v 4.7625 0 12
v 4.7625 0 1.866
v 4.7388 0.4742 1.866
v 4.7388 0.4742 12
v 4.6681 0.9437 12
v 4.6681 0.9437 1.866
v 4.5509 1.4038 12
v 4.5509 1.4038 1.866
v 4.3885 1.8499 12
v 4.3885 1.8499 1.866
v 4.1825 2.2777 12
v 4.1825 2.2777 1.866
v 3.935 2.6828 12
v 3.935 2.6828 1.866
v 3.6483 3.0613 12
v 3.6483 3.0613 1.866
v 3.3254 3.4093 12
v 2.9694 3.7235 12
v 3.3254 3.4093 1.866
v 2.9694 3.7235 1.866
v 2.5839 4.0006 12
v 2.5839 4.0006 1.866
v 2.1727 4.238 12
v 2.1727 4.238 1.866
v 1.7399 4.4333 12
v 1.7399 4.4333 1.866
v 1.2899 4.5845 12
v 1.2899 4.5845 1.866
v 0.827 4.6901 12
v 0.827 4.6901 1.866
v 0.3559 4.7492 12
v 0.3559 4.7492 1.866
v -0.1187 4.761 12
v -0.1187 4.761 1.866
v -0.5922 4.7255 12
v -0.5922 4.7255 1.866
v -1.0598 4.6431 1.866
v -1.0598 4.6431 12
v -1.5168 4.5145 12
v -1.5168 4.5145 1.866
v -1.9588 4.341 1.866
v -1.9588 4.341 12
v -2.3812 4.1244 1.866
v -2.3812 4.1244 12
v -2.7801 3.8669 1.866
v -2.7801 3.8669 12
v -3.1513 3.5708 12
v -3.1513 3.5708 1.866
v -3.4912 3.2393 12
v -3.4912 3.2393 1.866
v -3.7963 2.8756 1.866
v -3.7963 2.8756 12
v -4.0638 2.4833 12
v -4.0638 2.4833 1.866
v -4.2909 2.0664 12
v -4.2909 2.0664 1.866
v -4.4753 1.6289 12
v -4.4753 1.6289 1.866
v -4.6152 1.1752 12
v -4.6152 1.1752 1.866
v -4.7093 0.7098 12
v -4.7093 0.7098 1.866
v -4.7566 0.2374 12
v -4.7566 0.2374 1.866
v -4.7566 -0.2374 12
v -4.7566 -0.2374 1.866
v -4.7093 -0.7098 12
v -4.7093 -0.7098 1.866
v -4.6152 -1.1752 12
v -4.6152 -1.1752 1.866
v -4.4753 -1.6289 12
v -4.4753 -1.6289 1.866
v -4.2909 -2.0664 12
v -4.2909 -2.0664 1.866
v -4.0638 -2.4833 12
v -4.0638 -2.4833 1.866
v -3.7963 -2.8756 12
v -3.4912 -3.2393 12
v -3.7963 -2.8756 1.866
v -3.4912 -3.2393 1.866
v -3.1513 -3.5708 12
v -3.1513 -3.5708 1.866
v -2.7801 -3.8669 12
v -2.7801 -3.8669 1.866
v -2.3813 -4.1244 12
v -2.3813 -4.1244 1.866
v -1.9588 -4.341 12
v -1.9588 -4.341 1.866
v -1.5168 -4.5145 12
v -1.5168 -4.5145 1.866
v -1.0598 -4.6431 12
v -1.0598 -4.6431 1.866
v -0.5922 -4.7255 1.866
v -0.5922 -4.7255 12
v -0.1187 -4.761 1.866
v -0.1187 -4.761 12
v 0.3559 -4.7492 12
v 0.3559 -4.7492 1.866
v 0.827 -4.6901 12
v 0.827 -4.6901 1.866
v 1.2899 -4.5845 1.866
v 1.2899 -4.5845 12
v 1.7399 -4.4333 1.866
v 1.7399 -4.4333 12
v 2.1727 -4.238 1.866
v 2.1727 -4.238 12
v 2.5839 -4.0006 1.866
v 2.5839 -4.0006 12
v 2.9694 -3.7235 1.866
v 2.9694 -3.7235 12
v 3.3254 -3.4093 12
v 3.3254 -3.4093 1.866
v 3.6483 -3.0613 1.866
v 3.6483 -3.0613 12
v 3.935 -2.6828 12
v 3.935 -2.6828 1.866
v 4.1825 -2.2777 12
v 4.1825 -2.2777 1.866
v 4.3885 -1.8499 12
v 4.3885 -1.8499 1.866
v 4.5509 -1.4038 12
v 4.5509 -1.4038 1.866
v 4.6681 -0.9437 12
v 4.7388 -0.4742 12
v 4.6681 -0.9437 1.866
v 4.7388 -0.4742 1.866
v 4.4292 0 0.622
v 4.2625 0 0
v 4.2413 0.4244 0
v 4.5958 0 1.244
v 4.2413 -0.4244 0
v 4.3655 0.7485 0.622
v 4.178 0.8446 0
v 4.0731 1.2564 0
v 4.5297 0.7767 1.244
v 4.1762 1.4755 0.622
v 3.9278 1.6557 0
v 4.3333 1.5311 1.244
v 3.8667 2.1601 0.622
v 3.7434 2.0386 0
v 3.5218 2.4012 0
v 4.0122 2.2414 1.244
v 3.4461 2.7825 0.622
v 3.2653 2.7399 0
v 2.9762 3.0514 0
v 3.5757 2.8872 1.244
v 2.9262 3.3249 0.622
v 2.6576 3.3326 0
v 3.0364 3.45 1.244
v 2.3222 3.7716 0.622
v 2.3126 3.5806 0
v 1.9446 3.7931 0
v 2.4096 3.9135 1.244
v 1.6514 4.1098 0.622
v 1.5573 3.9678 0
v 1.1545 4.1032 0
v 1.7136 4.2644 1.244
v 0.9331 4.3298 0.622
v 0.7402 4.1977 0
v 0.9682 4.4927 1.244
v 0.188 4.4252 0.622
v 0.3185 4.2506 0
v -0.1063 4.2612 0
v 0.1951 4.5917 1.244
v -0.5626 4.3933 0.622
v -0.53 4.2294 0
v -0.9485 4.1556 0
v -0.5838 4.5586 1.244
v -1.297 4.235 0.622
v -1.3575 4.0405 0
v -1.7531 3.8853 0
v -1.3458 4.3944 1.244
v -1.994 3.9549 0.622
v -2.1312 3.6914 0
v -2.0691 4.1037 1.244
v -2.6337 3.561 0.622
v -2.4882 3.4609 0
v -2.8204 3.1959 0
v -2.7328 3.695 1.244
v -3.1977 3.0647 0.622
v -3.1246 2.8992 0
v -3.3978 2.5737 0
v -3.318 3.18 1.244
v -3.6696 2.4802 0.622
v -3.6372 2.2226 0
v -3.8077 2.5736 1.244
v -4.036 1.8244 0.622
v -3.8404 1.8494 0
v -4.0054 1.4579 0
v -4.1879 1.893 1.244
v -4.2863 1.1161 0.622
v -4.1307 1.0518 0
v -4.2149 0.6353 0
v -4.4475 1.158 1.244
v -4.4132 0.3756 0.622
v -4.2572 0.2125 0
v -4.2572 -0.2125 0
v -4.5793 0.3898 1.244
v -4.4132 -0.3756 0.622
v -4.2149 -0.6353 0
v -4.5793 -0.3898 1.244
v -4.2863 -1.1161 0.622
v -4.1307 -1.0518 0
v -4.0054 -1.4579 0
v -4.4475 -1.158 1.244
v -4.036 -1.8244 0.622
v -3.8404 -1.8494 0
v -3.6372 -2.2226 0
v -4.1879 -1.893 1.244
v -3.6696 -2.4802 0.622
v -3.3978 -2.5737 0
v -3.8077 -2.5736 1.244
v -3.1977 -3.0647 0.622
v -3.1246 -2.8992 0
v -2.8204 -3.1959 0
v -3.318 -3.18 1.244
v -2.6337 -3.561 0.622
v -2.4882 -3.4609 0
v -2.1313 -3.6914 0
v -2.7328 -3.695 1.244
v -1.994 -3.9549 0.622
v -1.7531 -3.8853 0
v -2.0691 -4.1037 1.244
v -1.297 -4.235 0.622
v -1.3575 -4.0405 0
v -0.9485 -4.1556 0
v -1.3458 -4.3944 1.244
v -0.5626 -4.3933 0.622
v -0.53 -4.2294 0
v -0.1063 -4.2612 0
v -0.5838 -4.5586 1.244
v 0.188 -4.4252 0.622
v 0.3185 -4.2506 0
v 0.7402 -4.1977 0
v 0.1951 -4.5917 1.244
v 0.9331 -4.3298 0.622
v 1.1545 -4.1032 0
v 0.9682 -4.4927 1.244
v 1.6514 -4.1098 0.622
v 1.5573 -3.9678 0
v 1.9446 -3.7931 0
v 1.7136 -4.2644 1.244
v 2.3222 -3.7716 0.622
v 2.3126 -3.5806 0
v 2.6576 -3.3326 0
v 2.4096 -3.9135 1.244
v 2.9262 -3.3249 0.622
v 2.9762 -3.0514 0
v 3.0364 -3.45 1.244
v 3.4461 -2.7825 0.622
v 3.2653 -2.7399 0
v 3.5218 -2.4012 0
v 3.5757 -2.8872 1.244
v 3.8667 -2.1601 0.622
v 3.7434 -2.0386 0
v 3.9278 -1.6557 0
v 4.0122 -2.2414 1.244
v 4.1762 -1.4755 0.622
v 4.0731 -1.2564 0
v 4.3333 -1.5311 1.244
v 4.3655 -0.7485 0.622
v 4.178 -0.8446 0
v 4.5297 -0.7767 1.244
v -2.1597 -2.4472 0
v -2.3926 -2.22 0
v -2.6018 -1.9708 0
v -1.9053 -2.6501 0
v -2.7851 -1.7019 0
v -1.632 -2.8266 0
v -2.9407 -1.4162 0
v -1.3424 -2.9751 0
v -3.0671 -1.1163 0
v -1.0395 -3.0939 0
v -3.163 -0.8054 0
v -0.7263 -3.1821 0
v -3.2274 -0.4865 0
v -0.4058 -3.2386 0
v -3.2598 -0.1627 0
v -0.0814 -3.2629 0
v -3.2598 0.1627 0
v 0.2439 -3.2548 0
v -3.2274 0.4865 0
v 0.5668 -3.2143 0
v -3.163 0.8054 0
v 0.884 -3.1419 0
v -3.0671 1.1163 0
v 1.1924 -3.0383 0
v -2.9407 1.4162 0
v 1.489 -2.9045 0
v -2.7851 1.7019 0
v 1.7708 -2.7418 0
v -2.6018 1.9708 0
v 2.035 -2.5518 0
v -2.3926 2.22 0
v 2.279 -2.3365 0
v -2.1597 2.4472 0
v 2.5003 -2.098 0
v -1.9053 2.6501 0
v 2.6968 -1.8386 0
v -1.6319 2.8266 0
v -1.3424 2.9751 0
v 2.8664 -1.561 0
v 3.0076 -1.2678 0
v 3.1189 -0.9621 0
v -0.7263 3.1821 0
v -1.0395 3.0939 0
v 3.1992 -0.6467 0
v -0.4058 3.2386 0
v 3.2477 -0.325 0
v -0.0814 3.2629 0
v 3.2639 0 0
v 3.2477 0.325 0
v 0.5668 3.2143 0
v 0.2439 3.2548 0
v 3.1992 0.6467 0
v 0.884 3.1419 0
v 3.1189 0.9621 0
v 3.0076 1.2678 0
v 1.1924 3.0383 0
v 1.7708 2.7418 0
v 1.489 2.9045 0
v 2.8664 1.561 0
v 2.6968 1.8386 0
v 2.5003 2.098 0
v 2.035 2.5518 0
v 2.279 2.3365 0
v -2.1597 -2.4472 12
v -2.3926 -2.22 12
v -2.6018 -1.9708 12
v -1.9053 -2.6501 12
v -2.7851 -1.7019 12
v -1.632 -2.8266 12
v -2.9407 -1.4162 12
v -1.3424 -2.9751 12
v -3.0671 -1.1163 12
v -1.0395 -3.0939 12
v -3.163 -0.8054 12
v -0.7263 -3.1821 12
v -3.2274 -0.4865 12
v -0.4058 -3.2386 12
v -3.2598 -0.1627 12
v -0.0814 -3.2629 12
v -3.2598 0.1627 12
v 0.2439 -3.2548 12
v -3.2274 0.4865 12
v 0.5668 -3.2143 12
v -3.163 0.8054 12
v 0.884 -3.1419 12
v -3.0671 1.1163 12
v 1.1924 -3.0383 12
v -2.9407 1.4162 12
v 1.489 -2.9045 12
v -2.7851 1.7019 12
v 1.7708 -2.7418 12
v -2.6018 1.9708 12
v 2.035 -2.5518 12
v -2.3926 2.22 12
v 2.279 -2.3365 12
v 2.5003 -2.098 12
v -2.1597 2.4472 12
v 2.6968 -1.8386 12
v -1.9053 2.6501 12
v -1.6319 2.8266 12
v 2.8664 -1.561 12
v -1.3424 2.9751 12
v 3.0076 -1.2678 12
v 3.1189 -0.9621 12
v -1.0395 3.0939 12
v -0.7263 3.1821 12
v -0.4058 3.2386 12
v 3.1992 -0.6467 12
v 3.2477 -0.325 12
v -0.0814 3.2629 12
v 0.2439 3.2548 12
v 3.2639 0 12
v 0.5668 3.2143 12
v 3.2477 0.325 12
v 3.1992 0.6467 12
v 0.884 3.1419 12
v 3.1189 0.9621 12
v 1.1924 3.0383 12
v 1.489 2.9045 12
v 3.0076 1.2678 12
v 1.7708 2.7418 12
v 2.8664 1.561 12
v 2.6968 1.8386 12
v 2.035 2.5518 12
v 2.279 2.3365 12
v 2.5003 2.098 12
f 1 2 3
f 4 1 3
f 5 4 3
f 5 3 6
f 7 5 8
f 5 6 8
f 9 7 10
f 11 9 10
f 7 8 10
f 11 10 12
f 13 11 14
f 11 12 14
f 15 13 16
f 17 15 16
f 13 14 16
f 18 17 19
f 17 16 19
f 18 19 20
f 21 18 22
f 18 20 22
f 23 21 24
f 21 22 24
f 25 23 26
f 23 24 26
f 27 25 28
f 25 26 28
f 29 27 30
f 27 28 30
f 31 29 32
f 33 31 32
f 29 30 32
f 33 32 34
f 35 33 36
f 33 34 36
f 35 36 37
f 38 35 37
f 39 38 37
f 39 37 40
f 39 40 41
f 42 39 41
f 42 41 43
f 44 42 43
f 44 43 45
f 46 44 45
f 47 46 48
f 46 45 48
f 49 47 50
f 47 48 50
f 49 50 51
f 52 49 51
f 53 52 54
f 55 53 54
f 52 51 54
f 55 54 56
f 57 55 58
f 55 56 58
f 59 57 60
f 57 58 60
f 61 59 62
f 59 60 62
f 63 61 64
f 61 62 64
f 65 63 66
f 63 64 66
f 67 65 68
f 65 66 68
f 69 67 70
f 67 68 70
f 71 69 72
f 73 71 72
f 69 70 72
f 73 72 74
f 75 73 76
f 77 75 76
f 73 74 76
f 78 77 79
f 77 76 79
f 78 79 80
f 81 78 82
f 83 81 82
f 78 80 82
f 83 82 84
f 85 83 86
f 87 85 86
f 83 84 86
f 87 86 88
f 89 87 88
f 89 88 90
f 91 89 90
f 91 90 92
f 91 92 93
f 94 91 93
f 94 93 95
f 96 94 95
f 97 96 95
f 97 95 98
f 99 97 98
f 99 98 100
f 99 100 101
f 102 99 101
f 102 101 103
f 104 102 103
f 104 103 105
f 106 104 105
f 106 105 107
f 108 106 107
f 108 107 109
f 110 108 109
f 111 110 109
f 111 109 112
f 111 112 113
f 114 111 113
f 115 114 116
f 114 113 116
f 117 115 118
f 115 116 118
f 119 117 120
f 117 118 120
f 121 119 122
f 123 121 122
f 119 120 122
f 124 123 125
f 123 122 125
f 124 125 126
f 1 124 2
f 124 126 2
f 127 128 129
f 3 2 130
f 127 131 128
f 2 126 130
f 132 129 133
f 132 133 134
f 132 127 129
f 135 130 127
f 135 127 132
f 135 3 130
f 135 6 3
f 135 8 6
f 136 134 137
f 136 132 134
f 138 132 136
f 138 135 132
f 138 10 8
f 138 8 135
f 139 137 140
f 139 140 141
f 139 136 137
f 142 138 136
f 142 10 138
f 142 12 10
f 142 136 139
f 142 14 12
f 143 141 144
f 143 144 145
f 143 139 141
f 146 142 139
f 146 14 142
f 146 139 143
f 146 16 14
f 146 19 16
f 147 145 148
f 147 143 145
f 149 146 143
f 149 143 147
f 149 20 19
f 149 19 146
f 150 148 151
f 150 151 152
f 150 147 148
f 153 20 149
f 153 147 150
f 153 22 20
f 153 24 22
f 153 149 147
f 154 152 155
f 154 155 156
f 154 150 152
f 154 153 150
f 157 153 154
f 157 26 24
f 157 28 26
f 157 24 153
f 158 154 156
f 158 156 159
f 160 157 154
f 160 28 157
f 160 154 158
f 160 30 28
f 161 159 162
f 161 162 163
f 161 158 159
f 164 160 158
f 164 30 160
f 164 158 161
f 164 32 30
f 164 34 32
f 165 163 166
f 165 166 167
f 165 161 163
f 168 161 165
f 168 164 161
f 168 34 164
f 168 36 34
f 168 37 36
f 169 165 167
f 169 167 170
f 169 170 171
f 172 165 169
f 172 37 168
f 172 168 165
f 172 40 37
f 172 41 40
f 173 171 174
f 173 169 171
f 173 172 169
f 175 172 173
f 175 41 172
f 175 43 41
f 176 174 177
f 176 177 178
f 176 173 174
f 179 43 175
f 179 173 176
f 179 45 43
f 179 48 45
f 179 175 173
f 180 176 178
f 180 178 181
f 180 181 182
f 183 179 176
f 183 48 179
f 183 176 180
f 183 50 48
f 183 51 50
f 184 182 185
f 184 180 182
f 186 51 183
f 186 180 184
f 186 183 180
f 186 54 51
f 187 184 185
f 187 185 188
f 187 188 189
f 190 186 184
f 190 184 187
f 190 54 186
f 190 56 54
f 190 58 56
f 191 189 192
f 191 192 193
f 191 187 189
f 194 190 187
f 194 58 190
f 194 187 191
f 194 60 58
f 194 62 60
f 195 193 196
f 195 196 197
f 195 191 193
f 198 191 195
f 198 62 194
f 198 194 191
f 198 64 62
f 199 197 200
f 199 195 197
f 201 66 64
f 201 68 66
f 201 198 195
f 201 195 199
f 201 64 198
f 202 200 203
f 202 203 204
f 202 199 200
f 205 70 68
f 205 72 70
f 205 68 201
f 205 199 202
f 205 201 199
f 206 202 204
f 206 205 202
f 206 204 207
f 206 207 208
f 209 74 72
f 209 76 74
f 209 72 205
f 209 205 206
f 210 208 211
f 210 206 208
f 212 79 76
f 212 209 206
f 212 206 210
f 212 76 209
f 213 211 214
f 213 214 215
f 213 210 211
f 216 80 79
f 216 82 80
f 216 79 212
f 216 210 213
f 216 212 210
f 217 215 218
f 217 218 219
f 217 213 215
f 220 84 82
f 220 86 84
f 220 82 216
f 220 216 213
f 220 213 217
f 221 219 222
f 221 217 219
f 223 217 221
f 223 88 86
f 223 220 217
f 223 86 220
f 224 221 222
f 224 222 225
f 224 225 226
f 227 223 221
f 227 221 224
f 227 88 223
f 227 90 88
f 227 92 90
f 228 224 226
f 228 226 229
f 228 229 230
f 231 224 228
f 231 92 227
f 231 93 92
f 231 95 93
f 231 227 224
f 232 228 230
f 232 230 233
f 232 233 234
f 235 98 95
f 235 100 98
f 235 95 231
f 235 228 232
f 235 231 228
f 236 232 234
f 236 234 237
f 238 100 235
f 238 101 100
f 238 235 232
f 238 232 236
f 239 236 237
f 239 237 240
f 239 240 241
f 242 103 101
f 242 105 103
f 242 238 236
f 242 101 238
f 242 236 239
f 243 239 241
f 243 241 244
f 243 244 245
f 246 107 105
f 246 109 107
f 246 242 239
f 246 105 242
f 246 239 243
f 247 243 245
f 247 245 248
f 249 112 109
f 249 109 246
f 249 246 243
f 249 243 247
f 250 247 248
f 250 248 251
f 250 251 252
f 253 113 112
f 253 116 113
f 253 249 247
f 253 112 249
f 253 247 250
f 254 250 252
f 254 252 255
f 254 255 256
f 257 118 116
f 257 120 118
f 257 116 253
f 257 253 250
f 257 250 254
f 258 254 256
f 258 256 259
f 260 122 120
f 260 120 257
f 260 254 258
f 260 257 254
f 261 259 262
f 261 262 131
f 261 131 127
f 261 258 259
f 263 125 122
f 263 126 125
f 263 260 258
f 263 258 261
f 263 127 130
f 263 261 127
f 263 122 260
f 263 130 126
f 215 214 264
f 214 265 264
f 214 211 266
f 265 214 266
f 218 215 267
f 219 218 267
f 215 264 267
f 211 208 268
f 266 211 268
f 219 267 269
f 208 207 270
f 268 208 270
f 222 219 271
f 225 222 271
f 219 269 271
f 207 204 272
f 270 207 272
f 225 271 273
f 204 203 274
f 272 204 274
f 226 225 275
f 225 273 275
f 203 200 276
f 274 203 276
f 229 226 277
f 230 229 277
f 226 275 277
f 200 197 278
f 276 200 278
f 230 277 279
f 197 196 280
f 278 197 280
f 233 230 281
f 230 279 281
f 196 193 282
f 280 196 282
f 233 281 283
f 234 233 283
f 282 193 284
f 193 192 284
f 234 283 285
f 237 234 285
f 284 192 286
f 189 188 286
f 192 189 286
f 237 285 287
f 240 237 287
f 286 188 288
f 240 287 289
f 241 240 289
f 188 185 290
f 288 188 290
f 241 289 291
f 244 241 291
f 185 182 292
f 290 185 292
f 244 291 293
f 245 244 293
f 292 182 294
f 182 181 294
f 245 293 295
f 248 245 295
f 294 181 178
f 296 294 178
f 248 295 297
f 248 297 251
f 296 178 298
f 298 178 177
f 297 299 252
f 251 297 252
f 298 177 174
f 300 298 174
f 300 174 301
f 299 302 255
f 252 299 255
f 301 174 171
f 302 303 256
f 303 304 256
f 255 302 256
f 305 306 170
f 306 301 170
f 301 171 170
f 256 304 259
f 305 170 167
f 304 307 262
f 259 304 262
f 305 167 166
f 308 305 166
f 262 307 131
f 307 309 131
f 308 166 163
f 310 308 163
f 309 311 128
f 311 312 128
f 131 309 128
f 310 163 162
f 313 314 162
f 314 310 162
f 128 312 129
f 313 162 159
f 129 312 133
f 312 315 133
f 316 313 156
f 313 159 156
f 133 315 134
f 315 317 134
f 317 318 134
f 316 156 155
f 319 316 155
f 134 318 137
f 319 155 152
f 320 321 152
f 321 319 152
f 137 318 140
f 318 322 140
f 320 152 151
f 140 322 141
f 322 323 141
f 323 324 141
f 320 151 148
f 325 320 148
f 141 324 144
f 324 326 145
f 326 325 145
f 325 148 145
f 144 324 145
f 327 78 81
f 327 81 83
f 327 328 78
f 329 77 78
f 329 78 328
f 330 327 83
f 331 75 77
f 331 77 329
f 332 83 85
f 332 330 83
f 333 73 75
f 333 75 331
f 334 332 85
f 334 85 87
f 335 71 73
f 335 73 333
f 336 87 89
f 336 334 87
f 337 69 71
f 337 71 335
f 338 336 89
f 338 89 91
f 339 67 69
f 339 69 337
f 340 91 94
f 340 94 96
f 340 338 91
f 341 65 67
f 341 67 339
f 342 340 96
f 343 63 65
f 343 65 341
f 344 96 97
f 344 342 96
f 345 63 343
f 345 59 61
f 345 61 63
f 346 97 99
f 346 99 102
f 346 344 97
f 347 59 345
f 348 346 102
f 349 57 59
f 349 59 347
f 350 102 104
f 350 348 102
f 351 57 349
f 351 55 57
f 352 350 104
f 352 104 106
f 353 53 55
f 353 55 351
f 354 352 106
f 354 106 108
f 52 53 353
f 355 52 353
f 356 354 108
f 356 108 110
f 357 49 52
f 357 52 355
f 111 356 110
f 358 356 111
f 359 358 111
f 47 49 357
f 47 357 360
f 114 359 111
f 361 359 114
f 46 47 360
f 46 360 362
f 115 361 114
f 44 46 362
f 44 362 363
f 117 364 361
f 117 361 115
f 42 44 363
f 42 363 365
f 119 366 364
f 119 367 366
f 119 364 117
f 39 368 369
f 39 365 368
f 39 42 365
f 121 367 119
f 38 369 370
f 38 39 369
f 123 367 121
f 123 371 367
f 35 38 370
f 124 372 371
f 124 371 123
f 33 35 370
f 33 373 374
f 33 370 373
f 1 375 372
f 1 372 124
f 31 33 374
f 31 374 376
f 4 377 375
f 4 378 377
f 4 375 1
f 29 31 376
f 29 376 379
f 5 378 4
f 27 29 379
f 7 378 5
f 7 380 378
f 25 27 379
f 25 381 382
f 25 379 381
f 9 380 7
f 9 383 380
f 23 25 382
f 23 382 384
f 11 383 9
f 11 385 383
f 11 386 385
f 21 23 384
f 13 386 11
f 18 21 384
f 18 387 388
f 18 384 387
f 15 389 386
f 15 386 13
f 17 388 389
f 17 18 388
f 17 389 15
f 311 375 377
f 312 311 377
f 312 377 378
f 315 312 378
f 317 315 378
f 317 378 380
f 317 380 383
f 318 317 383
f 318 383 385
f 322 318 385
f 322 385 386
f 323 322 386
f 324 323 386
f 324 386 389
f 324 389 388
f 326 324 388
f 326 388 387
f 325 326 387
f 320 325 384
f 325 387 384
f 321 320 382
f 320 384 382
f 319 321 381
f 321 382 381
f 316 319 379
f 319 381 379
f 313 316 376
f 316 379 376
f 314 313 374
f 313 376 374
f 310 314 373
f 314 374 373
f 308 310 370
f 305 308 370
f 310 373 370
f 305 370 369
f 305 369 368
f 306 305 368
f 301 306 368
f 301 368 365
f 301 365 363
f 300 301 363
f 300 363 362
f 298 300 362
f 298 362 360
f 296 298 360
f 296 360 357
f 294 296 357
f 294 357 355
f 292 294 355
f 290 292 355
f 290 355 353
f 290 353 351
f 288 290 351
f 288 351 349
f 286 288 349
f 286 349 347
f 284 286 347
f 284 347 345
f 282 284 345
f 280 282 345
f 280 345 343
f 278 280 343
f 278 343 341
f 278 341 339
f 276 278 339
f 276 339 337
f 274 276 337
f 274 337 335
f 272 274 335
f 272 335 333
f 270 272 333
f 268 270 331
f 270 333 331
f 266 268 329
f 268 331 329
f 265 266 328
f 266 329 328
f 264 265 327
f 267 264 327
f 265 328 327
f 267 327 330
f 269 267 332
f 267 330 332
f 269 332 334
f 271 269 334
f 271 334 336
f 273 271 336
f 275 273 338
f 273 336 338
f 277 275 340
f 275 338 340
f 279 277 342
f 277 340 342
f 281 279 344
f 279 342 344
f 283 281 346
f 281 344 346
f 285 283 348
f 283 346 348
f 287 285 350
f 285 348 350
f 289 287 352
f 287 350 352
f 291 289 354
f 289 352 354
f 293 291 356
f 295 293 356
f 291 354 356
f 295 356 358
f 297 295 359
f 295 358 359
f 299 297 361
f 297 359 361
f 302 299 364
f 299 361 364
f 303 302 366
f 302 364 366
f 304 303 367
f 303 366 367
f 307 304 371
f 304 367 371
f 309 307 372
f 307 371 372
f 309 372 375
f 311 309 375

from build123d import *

# Parameters (mm, degrees)
ESBO_O1_R                                  = 4.7625
RESSALTO_EXTRUS_O1_DEPTH                   = 12
CHANFRO1_SIZE                              = 0.5
CHANFRO1_SIZE2                             = 1.866025404
BROCA_DE_ROSQUEAR_PARA_TARRAXA_DE_5_16_1_D = 6.5278


with BuildPart() as part:
    # Esboço1 → Ressalto-extrusão1 (new body)
    with BuildSketch(Plane.XY):
        Circle(ESBO_O1_R)
    extrude(amount=RESSALTO_EXTRUS_O1_DEPTH)

    # Chanfro1
    chanfro1_edges = [part.edges().sort_by_distance(p)[0] for p in [
        (-4.7625, 0, 0),
    ]]
    chanfro1_side = [part.faces().sort_by_distance(p)[0] for p in [
        (0, 0, 0),
    ]]
    chamfer(chanfro1_edges, length=CHANFRO1_SIZE, length2=CHANFRO1_SIZE2, reference=chanfro1_side[0])

    # Broca de rosquear para tarraxa de 5/16-181 (through all)
    with Locations(Plane(origin=(0, 0, 0), x_dir=(-1, 0, 0), z_dir=(0, 0, -1))):
        with Locations((0, 0)):
            Hole(BROCA_DE_ROSQUEAR_PARA_TARRAXA_DE_5_16_1_D / 2)


solid = part.part
